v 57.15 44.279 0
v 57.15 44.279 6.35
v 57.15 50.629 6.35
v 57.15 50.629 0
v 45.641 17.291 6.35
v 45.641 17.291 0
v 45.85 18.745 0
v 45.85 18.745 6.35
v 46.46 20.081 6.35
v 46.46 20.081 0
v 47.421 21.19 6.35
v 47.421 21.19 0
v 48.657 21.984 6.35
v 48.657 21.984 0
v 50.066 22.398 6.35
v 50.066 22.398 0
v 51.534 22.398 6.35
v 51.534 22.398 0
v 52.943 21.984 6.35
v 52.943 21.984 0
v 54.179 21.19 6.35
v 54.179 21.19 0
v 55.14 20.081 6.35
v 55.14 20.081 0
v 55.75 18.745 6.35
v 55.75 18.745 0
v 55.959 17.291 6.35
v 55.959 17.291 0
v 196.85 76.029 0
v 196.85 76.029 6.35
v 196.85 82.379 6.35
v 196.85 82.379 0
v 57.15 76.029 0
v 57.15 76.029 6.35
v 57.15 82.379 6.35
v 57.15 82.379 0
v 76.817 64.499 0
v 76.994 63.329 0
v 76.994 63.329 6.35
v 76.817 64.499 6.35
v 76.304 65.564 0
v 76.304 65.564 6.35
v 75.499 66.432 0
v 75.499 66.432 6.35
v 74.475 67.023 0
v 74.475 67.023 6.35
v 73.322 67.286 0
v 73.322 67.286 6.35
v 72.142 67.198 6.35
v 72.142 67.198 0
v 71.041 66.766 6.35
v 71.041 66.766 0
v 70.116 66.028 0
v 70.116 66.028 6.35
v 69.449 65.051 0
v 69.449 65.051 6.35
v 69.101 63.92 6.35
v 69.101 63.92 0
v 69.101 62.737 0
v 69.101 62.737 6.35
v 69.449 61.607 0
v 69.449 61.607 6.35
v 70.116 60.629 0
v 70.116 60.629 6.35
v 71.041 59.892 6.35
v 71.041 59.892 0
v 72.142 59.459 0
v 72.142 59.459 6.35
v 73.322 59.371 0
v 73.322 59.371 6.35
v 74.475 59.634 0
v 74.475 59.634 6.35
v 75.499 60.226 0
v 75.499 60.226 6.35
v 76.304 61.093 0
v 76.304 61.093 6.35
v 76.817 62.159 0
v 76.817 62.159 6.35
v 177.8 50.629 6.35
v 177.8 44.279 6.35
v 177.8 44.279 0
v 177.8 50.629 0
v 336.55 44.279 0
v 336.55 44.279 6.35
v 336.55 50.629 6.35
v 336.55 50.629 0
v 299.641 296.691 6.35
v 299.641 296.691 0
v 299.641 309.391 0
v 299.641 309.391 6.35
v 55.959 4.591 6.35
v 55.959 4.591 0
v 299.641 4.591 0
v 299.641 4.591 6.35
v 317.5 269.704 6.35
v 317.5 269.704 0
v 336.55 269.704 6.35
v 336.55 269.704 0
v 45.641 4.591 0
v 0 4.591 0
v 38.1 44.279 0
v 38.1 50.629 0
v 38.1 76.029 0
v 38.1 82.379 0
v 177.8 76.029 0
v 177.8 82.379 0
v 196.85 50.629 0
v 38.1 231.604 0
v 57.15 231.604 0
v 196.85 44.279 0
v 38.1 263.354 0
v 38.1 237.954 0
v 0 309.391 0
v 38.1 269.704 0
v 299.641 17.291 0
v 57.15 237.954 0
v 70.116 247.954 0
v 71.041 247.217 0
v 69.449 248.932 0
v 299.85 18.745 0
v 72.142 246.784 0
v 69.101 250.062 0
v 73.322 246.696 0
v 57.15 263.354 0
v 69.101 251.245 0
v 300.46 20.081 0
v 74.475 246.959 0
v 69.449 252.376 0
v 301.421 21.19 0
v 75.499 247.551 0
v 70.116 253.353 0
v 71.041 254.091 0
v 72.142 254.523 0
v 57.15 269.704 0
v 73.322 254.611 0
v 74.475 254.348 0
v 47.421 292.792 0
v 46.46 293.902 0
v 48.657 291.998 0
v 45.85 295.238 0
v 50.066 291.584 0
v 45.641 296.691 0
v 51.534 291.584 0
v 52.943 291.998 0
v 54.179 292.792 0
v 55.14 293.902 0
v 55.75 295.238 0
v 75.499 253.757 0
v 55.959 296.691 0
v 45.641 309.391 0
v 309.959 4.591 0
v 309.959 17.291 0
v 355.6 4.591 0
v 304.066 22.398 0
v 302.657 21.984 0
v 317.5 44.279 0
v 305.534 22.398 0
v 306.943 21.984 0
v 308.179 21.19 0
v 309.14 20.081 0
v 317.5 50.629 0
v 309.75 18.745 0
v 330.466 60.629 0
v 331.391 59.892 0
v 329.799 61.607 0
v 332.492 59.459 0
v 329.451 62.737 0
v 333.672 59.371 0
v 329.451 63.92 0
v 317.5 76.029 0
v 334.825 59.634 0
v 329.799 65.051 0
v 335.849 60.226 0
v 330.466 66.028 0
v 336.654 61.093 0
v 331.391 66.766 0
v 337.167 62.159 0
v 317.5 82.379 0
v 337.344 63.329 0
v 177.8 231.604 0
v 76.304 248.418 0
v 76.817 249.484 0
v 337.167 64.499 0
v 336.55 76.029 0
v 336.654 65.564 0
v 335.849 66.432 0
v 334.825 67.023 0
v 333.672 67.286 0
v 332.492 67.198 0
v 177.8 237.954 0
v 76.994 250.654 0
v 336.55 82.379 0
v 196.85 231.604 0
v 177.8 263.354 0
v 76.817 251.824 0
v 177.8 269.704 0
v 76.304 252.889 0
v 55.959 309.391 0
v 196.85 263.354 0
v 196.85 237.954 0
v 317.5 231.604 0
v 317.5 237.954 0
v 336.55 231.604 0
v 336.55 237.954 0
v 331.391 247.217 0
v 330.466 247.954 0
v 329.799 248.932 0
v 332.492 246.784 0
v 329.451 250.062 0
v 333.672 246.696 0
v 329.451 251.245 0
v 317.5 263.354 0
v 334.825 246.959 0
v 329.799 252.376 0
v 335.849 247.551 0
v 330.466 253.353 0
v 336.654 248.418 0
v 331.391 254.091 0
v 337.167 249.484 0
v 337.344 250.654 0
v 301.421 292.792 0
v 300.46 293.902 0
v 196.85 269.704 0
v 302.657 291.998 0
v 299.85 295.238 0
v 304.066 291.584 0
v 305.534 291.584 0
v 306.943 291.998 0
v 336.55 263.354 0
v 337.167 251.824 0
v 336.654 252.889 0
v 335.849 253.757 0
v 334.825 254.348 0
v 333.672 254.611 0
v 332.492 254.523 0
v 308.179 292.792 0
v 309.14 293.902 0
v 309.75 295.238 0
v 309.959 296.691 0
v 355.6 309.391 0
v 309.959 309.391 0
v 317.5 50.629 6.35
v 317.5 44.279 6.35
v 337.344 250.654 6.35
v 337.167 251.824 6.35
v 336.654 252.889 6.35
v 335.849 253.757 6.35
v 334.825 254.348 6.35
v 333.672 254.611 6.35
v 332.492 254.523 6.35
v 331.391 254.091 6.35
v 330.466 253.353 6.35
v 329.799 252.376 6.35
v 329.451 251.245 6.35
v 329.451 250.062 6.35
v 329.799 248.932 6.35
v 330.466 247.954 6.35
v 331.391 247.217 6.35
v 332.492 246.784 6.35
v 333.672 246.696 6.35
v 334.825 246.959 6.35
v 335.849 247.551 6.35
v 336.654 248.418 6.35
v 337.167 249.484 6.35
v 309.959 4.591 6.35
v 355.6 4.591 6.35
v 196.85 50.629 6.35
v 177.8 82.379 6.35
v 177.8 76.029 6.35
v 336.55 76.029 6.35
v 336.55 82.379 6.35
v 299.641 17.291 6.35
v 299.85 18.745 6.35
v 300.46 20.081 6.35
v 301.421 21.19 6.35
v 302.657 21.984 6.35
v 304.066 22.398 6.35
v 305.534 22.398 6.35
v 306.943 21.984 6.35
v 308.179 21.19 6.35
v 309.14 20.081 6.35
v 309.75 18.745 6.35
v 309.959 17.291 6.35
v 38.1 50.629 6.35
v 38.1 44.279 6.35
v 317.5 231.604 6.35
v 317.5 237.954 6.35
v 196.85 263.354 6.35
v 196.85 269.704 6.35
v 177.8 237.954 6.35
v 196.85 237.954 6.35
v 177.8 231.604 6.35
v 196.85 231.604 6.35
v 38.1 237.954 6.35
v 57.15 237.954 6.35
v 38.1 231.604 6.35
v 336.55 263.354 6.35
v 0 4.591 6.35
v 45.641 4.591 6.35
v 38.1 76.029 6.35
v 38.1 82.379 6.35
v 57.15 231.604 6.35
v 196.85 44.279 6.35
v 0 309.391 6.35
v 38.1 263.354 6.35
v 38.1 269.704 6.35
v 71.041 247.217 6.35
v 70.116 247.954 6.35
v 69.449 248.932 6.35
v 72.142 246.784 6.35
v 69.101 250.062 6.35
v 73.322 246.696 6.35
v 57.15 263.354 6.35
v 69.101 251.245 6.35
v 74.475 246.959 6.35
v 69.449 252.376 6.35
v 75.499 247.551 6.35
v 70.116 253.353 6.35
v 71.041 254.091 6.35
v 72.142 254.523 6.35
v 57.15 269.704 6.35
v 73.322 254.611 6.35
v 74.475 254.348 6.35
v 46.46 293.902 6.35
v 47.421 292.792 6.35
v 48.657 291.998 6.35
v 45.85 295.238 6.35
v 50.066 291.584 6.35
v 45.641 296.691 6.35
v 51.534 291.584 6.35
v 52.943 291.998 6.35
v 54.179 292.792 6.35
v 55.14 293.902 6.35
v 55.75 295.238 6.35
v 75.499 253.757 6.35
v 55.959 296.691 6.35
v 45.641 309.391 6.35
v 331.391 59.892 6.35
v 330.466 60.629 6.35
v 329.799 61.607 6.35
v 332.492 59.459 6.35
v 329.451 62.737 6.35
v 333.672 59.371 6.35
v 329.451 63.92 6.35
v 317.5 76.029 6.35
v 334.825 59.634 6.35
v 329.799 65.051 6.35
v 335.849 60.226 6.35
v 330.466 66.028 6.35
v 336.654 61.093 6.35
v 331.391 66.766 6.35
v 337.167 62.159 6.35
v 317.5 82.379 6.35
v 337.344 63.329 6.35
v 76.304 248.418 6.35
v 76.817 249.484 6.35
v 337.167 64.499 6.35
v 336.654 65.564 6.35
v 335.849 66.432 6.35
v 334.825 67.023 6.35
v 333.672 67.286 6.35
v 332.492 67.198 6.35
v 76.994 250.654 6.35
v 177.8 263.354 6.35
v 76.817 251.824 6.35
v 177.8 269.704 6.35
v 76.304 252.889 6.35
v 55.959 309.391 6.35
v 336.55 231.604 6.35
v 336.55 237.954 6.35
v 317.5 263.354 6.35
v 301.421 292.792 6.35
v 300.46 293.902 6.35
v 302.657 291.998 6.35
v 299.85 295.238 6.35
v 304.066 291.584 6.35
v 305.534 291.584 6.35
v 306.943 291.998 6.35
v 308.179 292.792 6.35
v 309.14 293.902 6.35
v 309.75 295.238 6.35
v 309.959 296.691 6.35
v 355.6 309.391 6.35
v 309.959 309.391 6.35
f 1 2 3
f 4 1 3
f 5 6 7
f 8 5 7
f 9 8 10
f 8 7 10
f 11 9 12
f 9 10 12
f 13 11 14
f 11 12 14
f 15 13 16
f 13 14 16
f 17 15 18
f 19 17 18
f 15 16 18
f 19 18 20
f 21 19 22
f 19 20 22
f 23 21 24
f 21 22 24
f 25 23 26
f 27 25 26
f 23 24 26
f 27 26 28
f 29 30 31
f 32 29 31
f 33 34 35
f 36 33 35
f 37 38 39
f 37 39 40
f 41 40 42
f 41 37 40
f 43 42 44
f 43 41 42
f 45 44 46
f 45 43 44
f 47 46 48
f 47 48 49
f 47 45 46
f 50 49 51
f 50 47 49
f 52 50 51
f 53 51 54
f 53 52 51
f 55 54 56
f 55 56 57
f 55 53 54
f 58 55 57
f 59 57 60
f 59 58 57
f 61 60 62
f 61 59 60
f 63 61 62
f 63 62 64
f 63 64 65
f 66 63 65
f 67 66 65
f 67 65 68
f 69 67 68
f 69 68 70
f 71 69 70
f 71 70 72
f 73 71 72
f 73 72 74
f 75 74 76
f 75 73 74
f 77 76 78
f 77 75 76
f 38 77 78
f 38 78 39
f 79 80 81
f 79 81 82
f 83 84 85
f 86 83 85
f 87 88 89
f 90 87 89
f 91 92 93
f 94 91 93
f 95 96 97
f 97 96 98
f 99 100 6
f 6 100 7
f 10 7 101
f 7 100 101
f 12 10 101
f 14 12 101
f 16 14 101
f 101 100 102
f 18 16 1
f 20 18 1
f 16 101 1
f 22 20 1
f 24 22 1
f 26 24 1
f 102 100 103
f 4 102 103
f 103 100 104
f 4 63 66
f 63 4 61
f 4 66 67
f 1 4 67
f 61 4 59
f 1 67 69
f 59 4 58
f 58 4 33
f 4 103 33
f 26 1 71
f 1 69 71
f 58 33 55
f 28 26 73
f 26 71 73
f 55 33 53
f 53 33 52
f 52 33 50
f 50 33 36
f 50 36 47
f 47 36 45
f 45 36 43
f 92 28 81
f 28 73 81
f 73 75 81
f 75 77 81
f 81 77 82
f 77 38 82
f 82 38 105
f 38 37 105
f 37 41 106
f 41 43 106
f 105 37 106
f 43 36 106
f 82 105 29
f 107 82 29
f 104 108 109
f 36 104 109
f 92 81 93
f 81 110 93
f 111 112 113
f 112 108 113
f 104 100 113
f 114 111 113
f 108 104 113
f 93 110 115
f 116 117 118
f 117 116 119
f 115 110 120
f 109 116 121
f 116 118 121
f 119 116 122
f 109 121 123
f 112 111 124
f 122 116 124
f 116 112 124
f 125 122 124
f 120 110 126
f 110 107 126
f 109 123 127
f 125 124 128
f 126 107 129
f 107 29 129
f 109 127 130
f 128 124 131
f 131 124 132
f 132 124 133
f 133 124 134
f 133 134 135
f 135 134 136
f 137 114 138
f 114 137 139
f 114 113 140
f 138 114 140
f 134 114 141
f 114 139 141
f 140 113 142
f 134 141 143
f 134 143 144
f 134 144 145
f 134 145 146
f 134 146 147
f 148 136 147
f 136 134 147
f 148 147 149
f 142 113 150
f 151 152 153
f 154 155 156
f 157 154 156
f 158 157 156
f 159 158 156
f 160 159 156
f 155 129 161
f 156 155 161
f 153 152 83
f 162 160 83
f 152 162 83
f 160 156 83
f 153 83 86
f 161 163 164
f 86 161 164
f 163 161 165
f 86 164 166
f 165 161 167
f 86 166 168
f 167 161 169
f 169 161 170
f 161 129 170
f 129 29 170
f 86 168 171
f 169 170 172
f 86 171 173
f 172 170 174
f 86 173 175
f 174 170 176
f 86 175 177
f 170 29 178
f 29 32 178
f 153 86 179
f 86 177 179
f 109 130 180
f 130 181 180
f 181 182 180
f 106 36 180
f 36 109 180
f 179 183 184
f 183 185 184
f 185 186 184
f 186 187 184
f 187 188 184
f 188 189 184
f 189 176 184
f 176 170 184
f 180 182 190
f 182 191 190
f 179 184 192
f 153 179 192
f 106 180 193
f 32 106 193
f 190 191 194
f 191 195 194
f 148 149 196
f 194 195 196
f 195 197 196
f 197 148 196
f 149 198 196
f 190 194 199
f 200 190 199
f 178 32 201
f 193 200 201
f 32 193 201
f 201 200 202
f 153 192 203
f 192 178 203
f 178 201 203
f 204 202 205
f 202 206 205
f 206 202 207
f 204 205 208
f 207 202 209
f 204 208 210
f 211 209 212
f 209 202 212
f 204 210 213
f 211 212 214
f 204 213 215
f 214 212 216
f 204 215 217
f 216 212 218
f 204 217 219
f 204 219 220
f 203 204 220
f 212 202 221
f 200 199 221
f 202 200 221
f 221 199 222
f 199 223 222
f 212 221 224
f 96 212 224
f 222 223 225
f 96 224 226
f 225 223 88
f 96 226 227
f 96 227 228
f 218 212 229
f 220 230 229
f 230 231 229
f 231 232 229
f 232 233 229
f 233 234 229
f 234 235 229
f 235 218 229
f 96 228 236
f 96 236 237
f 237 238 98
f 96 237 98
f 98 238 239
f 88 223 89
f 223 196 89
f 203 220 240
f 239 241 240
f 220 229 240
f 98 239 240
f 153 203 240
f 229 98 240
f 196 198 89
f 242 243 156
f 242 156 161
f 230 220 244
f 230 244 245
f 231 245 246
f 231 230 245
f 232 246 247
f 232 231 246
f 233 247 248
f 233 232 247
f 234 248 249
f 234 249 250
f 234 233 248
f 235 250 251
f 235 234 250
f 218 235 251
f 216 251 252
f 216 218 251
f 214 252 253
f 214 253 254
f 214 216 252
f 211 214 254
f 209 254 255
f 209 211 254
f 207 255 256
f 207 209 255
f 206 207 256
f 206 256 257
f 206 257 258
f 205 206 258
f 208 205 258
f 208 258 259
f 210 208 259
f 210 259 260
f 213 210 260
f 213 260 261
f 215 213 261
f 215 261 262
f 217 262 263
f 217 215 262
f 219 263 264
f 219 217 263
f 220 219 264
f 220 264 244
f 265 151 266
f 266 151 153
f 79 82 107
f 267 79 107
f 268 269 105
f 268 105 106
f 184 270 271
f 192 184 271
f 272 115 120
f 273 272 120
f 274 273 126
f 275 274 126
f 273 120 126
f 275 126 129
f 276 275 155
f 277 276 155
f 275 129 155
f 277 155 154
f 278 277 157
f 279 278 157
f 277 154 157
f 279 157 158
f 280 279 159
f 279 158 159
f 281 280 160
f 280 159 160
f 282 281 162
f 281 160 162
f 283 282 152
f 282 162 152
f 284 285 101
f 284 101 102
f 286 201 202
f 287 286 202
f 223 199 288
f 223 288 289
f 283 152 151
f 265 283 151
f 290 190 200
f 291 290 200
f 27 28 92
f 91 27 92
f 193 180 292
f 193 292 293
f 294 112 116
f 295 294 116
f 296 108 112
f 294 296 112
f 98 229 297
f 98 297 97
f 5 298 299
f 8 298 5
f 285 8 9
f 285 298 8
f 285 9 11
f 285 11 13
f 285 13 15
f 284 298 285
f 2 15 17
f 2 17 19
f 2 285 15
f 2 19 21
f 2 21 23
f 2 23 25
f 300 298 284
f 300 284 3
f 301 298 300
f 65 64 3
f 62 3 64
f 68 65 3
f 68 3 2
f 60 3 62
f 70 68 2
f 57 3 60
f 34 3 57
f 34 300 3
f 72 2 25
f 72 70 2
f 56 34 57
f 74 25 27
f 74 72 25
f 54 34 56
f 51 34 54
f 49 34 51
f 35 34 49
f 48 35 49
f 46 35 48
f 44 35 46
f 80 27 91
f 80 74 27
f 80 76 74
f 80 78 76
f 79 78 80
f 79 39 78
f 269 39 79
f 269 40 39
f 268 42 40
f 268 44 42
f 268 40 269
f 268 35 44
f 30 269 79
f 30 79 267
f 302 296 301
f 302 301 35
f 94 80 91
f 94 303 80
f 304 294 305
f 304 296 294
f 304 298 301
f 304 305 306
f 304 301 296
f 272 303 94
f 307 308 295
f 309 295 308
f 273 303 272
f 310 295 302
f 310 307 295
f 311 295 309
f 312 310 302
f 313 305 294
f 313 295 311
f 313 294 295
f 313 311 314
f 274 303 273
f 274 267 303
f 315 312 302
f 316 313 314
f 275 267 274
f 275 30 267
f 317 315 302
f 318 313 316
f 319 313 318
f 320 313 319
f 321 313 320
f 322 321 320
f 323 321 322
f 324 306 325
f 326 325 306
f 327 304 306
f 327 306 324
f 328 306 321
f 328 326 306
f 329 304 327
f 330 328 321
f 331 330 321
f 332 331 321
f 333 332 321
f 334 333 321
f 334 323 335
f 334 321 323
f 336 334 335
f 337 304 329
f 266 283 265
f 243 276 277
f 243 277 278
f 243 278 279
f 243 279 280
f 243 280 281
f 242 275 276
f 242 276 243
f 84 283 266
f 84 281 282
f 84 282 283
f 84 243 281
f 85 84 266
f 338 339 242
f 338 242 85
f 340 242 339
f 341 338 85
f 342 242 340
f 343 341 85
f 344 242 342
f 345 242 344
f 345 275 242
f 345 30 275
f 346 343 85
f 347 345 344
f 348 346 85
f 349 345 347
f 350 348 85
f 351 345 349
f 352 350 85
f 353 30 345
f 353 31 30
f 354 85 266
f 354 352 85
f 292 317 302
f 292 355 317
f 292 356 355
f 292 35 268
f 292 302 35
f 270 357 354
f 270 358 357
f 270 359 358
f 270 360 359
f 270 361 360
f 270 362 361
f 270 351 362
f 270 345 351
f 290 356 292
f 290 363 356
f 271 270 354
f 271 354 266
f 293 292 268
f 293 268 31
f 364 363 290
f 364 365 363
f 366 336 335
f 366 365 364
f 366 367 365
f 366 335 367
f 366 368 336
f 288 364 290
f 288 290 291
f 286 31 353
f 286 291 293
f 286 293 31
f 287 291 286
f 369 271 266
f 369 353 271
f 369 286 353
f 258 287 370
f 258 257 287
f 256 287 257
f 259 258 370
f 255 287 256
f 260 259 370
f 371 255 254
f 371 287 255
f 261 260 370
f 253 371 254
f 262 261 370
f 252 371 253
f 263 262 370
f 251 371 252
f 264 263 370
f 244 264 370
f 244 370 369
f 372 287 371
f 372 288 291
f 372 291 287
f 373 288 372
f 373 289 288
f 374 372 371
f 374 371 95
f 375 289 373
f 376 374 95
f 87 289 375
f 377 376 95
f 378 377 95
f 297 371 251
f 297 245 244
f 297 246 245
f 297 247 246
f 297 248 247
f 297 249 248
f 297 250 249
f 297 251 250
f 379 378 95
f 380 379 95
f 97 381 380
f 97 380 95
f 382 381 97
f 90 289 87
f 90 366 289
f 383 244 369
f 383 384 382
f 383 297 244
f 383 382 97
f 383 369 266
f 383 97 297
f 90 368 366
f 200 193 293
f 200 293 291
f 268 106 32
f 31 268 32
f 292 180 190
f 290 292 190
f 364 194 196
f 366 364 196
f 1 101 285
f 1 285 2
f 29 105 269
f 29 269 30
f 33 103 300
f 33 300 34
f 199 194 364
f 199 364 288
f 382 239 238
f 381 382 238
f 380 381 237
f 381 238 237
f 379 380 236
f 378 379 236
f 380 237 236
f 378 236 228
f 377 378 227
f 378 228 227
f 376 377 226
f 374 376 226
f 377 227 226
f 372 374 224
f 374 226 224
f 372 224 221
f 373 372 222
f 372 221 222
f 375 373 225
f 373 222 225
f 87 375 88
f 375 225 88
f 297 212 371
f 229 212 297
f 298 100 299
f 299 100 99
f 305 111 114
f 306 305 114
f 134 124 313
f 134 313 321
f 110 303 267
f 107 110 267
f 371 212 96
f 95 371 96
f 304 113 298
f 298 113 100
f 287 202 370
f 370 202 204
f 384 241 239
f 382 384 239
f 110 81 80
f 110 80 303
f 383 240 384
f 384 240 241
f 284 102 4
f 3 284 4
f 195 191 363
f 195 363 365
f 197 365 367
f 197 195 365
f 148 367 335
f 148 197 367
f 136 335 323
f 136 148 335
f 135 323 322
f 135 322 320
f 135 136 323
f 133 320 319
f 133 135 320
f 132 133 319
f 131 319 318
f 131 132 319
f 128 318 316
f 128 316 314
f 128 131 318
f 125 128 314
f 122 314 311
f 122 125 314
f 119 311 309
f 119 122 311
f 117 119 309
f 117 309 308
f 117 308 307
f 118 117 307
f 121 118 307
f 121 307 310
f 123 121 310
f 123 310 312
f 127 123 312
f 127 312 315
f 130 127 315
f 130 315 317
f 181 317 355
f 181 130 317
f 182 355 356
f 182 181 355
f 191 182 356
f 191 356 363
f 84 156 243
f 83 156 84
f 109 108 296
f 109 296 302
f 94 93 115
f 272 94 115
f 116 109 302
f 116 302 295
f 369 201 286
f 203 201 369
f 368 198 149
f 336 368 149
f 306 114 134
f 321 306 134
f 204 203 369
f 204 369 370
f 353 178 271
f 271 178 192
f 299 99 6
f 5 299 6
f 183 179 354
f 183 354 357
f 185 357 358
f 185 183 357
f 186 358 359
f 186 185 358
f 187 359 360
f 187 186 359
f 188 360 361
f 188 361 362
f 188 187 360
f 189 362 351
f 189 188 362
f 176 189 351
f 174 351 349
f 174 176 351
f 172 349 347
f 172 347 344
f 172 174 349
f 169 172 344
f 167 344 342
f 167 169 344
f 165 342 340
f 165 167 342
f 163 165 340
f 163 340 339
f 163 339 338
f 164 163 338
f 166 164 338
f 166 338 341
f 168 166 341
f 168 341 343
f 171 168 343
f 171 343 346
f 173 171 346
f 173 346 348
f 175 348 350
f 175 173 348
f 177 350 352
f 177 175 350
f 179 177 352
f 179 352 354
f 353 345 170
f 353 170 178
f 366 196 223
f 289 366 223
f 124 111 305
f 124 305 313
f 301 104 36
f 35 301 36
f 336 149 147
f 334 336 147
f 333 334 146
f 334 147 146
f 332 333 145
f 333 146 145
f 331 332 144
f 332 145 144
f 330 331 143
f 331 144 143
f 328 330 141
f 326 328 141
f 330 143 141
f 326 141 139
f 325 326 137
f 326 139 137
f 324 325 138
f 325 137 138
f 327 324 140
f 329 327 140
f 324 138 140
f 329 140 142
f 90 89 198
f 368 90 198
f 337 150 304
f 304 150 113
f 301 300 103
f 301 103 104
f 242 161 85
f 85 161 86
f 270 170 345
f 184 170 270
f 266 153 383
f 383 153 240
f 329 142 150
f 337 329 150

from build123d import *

# Parameters (mm, degrees)
F0_W     = 19.05
F0_H     = 6.35
F0_R     = 3.96875
F1_DEPTH = 6.35


with BuildPart() as f1:
    # F0 (on Top) → F1 (new body)
    with BuildSketch(Plane.XY):
        with BuildLine():
            Line((0, 309.391197), (0, 4.591197))
            Line((0, 4.591197), (45.640625, 4.591197))
            Line((45.640625, 4.591197), (45.640625, 17.291197))
            ThreePointArc((45.640625, 17.291197), (50.8, 22.450572), (55.959375, 17.291197))
            Line((55.959375, 17.291197), (55.959375, 4.591197))
            Line((55.959375, 4.591197), (299.640625, 4.591197))
            Line((299.640625, 4.591197), (299.640625, 17.291197))
            ThreePointArc((299.640625, 17.291197), (304.8, 22.450572), (309.959375, 17.291197))
            Line((309.959375, 17.291197), (309.959375, 4.591197))
            Line((309.959375, 4.591197), (355.6, 4.591197))
            Line((355.6, 4.591197), (355.6, 309.391197))
            Line((355.6, 309.391197), (309.959375, 309.391197))
            Line((309.959375, 309.391197), (309.959375, 296.691197))
            ThreePointArc((309.959375, 296.691197), (304.8, 291.531822), (299.640625, 296.691197))
            Line((299.640625, 296.691197), (299.640625, 309.391197))
            Line((299.640625, 309.391197), (55.959375, 309.391197))
            Line((55.959375, 309.391197), (55.959375, 296.691197))
            ThreePointArc((55.959375, 296.691197), (50.8, 291.531822), (45.640625, 296.691197))
            Line((45.640625, 296.691197), (45.640625, 309.391197))
            Line((45.640625, 309.391197), (0, 309.391197))
        make_face()
        with Locations((47.625, 47.453697)):
            Rectangle(F0_W, F0_H, mode=Mode.SUBTRACT)
        with Locations((47.625, 79.203697)):
            Rectangle(F0_W, F0_H, mode=Mode.SUBTRACT)
        with Locations((73.025, 63.328697)):
            Circle(F0_R, mode=Mode.SUBTRACT)
        with Locations((187.325, 47.453697)):
            Rectangle(F0_W, F0_H, mode=Mode.SUBTRACT)
        with Locations((187.325, 79.203697)):
            Rectangle(F0_W, F0_H, mode=Mode.SUBTRACT)
        with Locations((327.025, 47.453697)):
            Rectangle(F0_W, F0_H, mode=Mode.SUBTRACT)
        with Locations((327.025, 79.203697)):
            Rectangle(F0_W, F0_H, mode=Mode.SUBTRACT)
        with Locations((333.375, 63.328697)):
            Circle(F0_R, mode=Mode.SUBTRACT)
        with Locations((47.625, 234.778697)):
            Rectangle(F0_W, F0_H, mode=Mode.SUBTRACT)
        with Locations((73.025, 250.653697)):
            Circle(F0_R, mode=Mode.SUBTRACT)
        with Locations((47.625, 266.528697)):
            Rectangle(F0_W, F0_H, mode=Mode.SUBTRACT)
        with Locations((187.325, 234.778697)):
            Rectangle(F0_W, F0_H, mode=Mode.SUBTRACT)
        with Locations((187.325, 266.528697)):
            Rectangle(F0_W, F0_H, mode=Mode.SUBTRACT)
        with Locations((327.025, 234.778697)):
            Rectangle(F0_W, F0_H, mode=Mode.SUBTRACT)
        with Locations((333.375, 250.653697)):
            Circle(F0_R, mode=Mode.SUBTRACT)
        with Locations((327.025, 266.528697)):
            Rectangle(F0_W, F0_H, mode=Mode.SUBTRACT)
    extrude(amount=F1_DEPTH)


solid = f1.part
